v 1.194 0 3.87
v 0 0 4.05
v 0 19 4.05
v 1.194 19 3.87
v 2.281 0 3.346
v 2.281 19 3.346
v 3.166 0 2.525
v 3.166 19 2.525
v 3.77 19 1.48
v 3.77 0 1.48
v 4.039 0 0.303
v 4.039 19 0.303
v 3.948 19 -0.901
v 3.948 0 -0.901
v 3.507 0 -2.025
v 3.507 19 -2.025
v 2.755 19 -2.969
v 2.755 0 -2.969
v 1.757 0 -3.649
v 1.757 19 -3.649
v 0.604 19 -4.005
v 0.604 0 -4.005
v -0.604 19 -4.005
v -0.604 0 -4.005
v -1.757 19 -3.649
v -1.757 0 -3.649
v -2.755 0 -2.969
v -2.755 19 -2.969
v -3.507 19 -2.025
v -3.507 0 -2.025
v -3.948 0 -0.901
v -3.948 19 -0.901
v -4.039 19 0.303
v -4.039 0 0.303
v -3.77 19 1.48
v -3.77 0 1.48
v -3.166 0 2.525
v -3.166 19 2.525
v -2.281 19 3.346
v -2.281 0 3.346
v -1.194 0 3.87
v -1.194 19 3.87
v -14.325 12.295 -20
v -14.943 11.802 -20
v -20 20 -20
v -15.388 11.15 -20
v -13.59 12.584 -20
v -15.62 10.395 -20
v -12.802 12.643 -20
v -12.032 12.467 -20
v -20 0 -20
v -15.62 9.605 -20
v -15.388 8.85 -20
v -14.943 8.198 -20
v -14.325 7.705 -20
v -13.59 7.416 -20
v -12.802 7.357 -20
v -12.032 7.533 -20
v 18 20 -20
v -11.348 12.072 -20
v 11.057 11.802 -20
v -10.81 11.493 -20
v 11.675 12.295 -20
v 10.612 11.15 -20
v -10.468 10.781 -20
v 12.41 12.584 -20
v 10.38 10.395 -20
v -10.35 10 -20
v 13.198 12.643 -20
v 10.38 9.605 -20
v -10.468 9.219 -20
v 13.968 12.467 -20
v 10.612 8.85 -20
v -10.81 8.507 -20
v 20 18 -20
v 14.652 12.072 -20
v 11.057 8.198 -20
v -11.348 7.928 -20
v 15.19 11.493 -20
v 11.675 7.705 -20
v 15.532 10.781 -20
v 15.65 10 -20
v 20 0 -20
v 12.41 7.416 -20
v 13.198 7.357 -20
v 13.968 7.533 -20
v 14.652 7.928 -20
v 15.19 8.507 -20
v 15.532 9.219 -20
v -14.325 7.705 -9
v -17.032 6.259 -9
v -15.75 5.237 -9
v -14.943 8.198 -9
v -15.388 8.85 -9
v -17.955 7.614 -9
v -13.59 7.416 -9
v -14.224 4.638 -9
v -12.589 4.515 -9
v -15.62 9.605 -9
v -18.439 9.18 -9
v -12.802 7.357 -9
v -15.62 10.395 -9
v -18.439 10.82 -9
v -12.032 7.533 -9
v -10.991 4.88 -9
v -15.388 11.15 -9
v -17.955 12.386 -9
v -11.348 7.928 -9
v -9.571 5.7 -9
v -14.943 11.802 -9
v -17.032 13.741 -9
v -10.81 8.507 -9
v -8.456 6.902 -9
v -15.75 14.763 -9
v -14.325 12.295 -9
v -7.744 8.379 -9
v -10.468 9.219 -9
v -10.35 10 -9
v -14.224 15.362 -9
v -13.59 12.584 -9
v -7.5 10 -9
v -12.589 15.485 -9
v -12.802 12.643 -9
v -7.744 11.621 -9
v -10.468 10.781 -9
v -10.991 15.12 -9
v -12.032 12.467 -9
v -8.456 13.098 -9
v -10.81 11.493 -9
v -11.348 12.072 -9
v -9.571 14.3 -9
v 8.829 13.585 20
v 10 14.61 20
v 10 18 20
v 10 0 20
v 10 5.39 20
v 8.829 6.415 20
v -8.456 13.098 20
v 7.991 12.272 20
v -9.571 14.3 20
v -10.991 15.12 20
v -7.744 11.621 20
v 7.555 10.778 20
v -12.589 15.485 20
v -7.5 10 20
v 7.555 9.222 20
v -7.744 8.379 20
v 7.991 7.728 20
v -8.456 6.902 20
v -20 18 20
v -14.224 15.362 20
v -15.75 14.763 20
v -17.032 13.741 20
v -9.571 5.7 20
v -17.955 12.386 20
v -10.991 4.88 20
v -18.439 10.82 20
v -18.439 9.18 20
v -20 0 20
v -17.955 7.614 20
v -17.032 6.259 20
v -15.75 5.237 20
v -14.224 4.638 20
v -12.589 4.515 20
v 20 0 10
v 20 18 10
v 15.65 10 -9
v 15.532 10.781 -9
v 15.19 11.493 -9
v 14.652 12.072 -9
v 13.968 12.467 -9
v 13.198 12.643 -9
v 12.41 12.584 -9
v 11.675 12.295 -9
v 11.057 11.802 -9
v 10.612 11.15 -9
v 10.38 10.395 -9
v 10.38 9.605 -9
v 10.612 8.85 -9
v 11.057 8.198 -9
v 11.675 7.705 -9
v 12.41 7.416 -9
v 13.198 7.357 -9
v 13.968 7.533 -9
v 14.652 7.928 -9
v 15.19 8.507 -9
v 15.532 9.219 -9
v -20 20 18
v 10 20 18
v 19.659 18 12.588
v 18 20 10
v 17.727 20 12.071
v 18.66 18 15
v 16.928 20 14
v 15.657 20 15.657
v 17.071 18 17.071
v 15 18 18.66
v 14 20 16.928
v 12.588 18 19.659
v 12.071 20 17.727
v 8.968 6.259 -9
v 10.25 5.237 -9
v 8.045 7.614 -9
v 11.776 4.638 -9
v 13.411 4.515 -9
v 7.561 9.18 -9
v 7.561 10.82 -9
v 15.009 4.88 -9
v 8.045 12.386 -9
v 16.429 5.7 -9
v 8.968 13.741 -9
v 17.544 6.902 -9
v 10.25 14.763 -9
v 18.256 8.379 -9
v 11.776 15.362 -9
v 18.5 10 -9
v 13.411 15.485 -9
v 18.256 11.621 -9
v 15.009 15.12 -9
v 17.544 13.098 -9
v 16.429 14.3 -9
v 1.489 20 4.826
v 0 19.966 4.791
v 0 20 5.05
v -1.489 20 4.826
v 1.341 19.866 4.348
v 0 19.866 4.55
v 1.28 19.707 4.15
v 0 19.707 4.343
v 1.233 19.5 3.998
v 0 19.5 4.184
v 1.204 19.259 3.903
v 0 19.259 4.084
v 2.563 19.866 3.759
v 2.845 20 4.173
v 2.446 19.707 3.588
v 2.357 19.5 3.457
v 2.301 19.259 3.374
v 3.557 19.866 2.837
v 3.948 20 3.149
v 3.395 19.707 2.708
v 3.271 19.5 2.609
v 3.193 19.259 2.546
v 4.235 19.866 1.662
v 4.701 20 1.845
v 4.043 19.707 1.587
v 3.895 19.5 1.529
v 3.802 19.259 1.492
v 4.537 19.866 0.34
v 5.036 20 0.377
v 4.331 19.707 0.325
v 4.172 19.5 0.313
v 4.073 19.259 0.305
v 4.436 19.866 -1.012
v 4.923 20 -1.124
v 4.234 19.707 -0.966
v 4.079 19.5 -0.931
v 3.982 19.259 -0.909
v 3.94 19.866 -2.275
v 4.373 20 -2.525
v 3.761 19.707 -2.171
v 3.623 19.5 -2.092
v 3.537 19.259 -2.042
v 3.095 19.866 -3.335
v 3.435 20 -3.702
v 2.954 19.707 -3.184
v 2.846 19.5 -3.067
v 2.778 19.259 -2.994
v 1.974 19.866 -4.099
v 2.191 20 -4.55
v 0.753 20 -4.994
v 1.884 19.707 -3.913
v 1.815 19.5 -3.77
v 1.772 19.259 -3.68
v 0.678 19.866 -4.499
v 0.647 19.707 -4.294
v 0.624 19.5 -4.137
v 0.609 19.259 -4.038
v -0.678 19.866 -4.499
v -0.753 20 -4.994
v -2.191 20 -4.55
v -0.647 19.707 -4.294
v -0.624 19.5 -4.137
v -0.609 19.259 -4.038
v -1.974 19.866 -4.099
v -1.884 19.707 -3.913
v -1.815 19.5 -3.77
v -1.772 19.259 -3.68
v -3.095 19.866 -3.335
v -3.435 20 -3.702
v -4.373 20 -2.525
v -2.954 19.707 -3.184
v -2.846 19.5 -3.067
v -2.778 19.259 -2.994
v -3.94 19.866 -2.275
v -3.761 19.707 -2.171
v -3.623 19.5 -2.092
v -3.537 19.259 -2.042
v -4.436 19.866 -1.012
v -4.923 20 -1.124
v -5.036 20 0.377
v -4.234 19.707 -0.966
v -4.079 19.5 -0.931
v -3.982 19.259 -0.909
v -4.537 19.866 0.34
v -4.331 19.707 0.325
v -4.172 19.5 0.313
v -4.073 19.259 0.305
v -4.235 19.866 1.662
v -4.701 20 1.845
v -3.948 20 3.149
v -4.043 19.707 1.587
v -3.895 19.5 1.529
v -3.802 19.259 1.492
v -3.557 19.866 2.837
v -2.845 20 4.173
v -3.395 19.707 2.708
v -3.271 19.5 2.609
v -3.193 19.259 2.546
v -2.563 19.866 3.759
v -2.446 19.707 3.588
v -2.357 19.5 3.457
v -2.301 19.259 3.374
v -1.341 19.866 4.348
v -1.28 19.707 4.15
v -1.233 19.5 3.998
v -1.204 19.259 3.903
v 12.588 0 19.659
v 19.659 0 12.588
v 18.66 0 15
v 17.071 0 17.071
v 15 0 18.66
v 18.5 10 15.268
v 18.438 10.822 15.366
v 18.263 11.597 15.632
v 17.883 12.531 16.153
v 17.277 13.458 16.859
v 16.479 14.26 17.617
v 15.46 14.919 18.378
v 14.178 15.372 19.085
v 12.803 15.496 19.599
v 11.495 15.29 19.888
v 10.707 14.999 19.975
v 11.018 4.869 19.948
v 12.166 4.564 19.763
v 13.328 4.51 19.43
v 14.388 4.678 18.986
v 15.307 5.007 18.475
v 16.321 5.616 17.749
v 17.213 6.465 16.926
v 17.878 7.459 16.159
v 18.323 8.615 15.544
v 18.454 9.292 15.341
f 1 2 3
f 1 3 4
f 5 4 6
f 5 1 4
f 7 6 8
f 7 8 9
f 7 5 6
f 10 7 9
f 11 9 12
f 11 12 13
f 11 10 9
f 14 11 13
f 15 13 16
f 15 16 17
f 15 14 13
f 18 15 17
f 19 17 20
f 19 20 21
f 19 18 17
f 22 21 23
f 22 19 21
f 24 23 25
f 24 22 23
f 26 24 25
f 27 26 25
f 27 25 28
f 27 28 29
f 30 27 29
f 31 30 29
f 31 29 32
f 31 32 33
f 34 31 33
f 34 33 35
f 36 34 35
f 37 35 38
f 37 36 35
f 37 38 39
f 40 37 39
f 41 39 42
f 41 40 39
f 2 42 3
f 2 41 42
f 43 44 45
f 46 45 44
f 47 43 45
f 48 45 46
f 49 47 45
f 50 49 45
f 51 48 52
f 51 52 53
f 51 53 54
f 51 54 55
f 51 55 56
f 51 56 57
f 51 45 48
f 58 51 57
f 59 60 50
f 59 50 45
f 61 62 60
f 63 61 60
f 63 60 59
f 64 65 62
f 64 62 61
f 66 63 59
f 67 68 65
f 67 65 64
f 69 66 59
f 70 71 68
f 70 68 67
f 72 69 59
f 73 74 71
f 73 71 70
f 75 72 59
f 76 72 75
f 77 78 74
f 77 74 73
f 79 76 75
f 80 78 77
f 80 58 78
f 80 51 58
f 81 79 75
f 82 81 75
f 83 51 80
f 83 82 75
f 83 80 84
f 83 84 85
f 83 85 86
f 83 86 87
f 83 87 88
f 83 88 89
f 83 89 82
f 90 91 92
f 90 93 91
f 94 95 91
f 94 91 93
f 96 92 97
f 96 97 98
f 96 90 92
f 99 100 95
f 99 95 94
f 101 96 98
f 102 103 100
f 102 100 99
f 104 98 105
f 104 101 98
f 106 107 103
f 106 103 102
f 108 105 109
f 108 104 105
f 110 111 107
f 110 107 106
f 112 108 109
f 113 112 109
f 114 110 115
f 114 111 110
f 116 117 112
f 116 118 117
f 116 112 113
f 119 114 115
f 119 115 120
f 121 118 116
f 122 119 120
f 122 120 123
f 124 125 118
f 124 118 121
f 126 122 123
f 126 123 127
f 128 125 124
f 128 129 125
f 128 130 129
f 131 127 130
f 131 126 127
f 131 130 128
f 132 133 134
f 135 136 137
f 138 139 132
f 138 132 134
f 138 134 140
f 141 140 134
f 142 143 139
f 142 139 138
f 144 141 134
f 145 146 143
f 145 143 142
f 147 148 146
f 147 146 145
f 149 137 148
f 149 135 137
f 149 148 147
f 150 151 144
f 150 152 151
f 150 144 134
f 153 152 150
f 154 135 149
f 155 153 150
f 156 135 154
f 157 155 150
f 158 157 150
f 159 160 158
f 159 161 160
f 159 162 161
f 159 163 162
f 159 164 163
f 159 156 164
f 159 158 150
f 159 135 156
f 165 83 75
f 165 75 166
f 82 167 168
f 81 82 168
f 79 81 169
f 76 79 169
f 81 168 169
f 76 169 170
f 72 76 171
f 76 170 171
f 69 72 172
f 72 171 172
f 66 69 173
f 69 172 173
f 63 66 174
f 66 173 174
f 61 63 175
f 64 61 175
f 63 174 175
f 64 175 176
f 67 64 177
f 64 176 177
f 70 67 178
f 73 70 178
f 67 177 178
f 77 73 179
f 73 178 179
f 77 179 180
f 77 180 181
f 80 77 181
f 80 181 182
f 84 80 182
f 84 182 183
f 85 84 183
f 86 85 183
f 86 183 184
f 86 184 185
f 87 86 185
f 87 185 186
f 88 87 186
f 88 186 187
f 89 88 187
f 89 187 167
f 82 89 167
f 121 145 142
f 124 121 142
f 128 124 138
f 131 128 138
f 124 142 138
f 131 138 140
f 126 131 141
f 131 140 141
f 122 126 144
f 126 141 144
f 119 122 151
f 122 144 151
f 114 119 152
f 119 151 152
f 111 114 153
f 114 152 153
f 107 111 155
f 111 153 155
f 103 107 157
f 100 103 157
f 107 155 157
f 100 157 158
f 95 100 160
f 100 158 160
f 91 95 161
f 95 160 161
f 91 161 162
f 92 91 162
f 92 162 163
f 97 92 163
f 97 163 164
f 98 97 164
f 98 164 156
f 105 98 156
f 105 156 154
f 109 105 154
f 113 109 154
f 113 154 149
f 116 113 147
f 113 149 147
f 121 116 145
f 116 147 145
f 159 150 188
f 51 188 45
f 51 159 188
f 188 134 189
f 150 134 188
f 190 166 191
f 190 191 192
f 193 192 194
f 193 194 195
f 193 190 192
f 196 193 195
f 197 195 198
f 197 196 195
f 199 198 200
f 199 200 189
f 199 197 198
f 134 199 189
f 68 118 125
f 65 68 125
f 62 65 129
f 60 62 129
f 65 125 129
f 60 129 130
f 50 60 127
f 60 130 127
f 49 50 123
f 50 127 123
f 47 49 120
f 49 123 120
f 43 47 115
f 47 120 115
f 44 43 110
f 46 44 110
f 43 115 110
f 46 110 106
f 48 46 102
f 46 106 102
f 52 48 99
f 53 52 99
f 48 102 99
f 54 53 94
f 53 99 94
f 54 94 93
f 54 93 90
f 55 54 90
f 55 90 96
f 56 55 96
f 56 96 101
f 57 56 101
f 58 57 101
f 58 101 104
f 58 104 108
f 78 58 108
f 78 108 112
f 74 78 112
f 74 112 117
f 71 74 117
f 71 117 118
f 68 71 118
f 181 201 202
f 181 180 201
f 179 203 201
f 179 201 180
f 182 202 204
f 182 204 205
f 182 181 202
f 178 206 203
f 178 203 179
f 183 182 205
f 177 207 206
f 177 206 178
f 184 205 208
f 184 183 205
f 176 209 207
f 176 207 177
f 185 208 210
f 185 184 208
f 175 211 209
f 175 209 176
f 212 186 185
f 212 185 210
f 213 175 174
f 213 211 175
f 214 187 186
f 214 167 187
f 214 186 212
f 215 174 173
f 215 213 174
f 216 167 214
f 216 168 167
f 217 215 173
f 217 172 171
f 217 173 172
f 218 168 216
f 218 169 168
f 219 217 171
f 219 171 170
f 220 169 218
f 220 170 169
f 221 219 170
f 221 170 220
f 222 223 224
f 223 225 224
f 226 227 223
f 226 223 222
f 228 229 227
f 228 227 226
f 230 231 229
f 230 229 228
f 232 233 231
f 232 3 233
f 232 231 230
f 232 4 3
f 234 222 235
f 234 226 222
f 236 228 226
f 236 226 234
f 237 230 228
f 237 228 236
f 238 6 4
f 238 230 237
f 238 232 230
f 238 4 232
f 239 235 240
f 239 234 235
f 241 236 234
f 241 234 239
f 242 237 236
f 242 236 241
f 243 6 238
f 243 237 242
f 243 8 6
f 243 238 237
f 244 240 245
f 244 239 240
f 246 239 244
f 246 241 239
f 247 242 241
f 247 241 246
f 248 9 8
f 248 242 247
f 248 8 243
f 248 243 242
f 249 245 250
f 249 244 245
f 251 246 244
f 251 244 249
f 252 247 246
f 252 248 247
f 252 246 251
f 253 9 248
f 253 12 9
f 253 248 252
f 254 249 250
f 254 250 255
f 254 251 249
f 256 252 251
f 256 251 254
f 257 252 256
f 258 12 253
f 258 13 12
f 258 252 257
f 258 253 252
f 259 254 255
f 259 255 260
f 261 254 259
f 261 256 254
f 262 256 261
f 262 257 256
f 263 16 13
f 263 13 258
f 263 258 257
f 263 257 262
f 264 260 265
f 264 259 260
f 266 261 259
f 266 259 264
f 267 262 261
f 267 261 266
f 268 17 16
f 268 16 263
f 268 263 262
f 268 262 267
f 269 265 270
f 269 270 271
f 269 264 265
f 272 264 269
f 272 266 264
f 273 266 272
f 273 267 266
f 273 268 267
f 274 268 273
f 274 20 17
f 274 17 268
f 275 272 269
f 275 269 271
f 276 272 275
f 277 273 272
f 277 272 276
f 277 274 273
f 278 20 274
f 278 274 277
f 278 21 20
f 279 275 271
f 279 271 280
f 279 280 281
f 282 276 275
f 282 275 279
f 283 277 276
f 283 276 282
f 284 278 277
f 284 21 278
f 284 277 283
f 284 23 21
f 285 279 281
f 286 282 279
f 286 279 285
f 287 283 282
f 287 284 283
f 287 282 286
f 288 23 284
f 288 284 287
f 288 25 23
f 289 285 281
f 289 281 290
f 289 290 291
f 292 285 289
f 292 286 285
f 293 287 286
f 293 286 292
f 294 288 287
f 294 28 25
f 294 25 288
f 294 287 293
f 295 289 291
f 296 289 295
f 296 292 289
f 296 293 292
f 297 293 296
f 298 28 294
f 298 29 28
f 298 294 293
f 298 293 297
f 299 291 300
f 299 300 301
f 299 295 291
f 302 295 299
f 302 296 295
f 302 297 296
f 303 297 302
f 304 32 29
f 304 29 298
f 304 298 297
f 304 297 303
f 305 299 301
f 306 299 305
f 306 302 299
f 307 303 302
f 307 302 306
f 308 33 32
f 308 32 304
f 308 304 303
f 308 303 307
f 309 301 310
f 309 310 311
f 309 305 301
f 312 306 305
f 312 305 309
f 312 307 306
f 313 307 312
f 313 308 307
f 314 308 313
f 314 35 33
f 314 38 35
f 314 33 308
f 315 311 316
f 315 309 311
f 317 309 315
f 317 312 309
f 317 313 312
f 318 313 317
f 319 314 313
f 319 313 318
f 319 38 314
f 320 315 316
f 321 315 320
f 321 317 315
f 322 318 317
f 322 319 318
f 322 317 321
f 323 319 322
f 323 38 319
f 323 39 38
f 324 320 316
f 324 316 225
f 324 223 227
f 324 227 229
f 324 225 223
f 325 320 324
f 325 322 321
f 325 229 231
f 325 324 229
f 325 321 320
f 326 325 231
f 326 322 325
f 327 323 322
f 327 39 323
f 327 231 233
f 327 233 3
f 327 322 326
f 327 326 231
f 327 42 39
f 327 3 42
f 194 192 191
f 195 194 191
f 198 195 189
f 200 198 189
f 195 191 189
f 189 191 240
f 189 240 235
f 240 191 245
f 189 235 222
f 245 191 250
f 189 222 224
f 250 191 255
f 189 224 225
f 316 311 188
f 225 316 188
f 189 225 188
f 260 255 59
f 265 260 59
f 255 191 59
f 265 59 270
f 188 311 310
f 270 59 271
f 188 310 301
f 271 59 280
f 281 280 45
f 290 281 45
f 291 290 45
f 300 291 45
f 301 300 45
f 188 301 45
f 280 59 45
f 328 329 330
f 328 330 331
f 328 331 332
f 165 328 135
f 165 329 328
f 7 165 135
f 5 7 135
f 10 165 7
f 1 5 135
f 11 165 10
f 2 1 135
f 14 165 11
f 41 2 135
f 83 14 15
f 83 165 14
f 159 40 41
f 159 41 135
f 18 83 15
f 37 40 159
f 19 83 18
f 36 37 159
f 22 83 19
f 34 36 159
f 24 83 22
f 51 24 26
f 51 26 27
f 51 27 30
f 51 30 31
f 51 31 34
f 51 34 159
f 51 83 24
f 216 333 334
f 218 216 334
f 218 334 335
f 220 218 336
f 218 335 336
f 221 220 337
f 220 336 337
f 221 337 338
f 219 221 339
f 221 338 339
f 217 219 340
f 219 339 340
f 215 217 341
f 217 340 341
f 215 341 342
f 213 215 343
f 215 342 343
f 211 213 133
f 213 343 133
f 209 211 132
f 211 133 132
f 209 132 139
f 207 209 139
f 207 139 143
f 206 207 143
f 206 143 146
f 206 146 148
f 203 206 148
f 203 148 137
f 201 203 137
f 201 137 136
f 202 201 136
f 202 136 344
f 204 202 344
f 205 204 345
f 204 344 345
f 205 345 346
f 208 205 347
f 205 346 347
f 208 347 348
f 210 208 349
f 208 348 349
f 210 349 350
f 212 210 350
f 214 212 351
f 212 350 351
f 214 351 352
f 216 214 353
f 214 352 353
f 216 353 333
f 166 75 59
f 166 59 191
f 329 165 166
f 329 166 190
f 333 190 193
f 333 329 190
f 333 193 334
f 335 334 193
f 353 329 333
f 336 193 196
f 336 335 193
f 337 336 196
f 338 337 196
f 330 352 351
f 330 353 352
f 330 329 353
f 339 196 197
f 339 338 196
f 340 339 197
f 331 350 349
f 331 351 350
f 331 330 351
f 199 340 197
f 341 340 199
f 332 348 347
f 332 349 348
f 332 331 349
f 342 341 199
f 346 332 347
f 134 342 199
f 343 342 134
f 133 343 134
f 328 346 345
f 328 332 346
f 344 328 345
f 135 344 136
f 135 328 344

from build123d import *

# Parameters (mm, degrees)
SKETCH1_R           = 4.05
BOSS_EXTRUDE1_DEPTH = 20
SKETCH3_R           = 2.65
CUT_EXTRUDE5_DEPTH  = 40
SKETCH6_R           = 5.5
CUT_EXTRUDE7_DEPTH  = 29
CHAMFER1_SIZE       = 2
FILLET1_R           = 1


with BuildPart() as part:
    # Sketch1 → Boss-Extrude1 (new body)
    with BuildSketch(Plane(origin=(0, 0, 0), x_dir=(1, 0, 0), z_dir=(0, 1, 0))):
        with BuildLine():
            Line((10, -20), (-20, -20))
            Line((-20, -20), (-20, 20))
            Line((-20, 20), (20, 20))
            Line((20, 20), (20, -10))
            ThreePointArc((20, -10), (17.071067812, -17.071067812), (10, -20))
        make_face()
        with Locations(Location((0, 0, 0), (0, 0, 270))):
            Circle(SKETCH1_R, mode=Mode.SUBTRACT)
    extrude(amount=BOSS_EXTRUDE1_DEPTH)

    # Sketch3 → Cut-Extrude5 (cut)
    with BuildSketch(Plane.XY.offset(20)):
        with Locations((-13, 10)):
            Circle(SKETCH3_R)
        with Locations((13, 10)):
            Circle(SKETCH3_R)
    extrude(amount=-CUT_EXTRUDE5_DEPTH, mode=Mode.SUBTRACT)

    # Sketch6 → Cut-Extrude7 (cut)
    with BuildSketch(Plane.XY.offset(20)):
        with Locations((-13, 10)):
            Circle(SKETCH6_R)
        with Locations((13, 10)):
            Circle(SKETCH6_R)
    extrude(amount=-CUT_EXTRUDE7_DEPTH, mode=Mode.SUBTRACT)

    # Chamfer1
    chamfer1_edges = [part.edges().sort_by_distance(p)[0] for p in [
        (17.071067812, 20, 17.071067812),
        (20, 20, -5),
        (-5, 20, 20),
    ]]
    chamfer(chamfer1_edges, length=CHAMFER1_SIZE)

    # Fillet1
    fillet1_edges = [part.edges().sort_by_distance(p)[0] for p in [
        (0, 20, -4.05),
    ]]
    fillet(fillet1_edges, radius=FILLET1_R)


solid = part.part
